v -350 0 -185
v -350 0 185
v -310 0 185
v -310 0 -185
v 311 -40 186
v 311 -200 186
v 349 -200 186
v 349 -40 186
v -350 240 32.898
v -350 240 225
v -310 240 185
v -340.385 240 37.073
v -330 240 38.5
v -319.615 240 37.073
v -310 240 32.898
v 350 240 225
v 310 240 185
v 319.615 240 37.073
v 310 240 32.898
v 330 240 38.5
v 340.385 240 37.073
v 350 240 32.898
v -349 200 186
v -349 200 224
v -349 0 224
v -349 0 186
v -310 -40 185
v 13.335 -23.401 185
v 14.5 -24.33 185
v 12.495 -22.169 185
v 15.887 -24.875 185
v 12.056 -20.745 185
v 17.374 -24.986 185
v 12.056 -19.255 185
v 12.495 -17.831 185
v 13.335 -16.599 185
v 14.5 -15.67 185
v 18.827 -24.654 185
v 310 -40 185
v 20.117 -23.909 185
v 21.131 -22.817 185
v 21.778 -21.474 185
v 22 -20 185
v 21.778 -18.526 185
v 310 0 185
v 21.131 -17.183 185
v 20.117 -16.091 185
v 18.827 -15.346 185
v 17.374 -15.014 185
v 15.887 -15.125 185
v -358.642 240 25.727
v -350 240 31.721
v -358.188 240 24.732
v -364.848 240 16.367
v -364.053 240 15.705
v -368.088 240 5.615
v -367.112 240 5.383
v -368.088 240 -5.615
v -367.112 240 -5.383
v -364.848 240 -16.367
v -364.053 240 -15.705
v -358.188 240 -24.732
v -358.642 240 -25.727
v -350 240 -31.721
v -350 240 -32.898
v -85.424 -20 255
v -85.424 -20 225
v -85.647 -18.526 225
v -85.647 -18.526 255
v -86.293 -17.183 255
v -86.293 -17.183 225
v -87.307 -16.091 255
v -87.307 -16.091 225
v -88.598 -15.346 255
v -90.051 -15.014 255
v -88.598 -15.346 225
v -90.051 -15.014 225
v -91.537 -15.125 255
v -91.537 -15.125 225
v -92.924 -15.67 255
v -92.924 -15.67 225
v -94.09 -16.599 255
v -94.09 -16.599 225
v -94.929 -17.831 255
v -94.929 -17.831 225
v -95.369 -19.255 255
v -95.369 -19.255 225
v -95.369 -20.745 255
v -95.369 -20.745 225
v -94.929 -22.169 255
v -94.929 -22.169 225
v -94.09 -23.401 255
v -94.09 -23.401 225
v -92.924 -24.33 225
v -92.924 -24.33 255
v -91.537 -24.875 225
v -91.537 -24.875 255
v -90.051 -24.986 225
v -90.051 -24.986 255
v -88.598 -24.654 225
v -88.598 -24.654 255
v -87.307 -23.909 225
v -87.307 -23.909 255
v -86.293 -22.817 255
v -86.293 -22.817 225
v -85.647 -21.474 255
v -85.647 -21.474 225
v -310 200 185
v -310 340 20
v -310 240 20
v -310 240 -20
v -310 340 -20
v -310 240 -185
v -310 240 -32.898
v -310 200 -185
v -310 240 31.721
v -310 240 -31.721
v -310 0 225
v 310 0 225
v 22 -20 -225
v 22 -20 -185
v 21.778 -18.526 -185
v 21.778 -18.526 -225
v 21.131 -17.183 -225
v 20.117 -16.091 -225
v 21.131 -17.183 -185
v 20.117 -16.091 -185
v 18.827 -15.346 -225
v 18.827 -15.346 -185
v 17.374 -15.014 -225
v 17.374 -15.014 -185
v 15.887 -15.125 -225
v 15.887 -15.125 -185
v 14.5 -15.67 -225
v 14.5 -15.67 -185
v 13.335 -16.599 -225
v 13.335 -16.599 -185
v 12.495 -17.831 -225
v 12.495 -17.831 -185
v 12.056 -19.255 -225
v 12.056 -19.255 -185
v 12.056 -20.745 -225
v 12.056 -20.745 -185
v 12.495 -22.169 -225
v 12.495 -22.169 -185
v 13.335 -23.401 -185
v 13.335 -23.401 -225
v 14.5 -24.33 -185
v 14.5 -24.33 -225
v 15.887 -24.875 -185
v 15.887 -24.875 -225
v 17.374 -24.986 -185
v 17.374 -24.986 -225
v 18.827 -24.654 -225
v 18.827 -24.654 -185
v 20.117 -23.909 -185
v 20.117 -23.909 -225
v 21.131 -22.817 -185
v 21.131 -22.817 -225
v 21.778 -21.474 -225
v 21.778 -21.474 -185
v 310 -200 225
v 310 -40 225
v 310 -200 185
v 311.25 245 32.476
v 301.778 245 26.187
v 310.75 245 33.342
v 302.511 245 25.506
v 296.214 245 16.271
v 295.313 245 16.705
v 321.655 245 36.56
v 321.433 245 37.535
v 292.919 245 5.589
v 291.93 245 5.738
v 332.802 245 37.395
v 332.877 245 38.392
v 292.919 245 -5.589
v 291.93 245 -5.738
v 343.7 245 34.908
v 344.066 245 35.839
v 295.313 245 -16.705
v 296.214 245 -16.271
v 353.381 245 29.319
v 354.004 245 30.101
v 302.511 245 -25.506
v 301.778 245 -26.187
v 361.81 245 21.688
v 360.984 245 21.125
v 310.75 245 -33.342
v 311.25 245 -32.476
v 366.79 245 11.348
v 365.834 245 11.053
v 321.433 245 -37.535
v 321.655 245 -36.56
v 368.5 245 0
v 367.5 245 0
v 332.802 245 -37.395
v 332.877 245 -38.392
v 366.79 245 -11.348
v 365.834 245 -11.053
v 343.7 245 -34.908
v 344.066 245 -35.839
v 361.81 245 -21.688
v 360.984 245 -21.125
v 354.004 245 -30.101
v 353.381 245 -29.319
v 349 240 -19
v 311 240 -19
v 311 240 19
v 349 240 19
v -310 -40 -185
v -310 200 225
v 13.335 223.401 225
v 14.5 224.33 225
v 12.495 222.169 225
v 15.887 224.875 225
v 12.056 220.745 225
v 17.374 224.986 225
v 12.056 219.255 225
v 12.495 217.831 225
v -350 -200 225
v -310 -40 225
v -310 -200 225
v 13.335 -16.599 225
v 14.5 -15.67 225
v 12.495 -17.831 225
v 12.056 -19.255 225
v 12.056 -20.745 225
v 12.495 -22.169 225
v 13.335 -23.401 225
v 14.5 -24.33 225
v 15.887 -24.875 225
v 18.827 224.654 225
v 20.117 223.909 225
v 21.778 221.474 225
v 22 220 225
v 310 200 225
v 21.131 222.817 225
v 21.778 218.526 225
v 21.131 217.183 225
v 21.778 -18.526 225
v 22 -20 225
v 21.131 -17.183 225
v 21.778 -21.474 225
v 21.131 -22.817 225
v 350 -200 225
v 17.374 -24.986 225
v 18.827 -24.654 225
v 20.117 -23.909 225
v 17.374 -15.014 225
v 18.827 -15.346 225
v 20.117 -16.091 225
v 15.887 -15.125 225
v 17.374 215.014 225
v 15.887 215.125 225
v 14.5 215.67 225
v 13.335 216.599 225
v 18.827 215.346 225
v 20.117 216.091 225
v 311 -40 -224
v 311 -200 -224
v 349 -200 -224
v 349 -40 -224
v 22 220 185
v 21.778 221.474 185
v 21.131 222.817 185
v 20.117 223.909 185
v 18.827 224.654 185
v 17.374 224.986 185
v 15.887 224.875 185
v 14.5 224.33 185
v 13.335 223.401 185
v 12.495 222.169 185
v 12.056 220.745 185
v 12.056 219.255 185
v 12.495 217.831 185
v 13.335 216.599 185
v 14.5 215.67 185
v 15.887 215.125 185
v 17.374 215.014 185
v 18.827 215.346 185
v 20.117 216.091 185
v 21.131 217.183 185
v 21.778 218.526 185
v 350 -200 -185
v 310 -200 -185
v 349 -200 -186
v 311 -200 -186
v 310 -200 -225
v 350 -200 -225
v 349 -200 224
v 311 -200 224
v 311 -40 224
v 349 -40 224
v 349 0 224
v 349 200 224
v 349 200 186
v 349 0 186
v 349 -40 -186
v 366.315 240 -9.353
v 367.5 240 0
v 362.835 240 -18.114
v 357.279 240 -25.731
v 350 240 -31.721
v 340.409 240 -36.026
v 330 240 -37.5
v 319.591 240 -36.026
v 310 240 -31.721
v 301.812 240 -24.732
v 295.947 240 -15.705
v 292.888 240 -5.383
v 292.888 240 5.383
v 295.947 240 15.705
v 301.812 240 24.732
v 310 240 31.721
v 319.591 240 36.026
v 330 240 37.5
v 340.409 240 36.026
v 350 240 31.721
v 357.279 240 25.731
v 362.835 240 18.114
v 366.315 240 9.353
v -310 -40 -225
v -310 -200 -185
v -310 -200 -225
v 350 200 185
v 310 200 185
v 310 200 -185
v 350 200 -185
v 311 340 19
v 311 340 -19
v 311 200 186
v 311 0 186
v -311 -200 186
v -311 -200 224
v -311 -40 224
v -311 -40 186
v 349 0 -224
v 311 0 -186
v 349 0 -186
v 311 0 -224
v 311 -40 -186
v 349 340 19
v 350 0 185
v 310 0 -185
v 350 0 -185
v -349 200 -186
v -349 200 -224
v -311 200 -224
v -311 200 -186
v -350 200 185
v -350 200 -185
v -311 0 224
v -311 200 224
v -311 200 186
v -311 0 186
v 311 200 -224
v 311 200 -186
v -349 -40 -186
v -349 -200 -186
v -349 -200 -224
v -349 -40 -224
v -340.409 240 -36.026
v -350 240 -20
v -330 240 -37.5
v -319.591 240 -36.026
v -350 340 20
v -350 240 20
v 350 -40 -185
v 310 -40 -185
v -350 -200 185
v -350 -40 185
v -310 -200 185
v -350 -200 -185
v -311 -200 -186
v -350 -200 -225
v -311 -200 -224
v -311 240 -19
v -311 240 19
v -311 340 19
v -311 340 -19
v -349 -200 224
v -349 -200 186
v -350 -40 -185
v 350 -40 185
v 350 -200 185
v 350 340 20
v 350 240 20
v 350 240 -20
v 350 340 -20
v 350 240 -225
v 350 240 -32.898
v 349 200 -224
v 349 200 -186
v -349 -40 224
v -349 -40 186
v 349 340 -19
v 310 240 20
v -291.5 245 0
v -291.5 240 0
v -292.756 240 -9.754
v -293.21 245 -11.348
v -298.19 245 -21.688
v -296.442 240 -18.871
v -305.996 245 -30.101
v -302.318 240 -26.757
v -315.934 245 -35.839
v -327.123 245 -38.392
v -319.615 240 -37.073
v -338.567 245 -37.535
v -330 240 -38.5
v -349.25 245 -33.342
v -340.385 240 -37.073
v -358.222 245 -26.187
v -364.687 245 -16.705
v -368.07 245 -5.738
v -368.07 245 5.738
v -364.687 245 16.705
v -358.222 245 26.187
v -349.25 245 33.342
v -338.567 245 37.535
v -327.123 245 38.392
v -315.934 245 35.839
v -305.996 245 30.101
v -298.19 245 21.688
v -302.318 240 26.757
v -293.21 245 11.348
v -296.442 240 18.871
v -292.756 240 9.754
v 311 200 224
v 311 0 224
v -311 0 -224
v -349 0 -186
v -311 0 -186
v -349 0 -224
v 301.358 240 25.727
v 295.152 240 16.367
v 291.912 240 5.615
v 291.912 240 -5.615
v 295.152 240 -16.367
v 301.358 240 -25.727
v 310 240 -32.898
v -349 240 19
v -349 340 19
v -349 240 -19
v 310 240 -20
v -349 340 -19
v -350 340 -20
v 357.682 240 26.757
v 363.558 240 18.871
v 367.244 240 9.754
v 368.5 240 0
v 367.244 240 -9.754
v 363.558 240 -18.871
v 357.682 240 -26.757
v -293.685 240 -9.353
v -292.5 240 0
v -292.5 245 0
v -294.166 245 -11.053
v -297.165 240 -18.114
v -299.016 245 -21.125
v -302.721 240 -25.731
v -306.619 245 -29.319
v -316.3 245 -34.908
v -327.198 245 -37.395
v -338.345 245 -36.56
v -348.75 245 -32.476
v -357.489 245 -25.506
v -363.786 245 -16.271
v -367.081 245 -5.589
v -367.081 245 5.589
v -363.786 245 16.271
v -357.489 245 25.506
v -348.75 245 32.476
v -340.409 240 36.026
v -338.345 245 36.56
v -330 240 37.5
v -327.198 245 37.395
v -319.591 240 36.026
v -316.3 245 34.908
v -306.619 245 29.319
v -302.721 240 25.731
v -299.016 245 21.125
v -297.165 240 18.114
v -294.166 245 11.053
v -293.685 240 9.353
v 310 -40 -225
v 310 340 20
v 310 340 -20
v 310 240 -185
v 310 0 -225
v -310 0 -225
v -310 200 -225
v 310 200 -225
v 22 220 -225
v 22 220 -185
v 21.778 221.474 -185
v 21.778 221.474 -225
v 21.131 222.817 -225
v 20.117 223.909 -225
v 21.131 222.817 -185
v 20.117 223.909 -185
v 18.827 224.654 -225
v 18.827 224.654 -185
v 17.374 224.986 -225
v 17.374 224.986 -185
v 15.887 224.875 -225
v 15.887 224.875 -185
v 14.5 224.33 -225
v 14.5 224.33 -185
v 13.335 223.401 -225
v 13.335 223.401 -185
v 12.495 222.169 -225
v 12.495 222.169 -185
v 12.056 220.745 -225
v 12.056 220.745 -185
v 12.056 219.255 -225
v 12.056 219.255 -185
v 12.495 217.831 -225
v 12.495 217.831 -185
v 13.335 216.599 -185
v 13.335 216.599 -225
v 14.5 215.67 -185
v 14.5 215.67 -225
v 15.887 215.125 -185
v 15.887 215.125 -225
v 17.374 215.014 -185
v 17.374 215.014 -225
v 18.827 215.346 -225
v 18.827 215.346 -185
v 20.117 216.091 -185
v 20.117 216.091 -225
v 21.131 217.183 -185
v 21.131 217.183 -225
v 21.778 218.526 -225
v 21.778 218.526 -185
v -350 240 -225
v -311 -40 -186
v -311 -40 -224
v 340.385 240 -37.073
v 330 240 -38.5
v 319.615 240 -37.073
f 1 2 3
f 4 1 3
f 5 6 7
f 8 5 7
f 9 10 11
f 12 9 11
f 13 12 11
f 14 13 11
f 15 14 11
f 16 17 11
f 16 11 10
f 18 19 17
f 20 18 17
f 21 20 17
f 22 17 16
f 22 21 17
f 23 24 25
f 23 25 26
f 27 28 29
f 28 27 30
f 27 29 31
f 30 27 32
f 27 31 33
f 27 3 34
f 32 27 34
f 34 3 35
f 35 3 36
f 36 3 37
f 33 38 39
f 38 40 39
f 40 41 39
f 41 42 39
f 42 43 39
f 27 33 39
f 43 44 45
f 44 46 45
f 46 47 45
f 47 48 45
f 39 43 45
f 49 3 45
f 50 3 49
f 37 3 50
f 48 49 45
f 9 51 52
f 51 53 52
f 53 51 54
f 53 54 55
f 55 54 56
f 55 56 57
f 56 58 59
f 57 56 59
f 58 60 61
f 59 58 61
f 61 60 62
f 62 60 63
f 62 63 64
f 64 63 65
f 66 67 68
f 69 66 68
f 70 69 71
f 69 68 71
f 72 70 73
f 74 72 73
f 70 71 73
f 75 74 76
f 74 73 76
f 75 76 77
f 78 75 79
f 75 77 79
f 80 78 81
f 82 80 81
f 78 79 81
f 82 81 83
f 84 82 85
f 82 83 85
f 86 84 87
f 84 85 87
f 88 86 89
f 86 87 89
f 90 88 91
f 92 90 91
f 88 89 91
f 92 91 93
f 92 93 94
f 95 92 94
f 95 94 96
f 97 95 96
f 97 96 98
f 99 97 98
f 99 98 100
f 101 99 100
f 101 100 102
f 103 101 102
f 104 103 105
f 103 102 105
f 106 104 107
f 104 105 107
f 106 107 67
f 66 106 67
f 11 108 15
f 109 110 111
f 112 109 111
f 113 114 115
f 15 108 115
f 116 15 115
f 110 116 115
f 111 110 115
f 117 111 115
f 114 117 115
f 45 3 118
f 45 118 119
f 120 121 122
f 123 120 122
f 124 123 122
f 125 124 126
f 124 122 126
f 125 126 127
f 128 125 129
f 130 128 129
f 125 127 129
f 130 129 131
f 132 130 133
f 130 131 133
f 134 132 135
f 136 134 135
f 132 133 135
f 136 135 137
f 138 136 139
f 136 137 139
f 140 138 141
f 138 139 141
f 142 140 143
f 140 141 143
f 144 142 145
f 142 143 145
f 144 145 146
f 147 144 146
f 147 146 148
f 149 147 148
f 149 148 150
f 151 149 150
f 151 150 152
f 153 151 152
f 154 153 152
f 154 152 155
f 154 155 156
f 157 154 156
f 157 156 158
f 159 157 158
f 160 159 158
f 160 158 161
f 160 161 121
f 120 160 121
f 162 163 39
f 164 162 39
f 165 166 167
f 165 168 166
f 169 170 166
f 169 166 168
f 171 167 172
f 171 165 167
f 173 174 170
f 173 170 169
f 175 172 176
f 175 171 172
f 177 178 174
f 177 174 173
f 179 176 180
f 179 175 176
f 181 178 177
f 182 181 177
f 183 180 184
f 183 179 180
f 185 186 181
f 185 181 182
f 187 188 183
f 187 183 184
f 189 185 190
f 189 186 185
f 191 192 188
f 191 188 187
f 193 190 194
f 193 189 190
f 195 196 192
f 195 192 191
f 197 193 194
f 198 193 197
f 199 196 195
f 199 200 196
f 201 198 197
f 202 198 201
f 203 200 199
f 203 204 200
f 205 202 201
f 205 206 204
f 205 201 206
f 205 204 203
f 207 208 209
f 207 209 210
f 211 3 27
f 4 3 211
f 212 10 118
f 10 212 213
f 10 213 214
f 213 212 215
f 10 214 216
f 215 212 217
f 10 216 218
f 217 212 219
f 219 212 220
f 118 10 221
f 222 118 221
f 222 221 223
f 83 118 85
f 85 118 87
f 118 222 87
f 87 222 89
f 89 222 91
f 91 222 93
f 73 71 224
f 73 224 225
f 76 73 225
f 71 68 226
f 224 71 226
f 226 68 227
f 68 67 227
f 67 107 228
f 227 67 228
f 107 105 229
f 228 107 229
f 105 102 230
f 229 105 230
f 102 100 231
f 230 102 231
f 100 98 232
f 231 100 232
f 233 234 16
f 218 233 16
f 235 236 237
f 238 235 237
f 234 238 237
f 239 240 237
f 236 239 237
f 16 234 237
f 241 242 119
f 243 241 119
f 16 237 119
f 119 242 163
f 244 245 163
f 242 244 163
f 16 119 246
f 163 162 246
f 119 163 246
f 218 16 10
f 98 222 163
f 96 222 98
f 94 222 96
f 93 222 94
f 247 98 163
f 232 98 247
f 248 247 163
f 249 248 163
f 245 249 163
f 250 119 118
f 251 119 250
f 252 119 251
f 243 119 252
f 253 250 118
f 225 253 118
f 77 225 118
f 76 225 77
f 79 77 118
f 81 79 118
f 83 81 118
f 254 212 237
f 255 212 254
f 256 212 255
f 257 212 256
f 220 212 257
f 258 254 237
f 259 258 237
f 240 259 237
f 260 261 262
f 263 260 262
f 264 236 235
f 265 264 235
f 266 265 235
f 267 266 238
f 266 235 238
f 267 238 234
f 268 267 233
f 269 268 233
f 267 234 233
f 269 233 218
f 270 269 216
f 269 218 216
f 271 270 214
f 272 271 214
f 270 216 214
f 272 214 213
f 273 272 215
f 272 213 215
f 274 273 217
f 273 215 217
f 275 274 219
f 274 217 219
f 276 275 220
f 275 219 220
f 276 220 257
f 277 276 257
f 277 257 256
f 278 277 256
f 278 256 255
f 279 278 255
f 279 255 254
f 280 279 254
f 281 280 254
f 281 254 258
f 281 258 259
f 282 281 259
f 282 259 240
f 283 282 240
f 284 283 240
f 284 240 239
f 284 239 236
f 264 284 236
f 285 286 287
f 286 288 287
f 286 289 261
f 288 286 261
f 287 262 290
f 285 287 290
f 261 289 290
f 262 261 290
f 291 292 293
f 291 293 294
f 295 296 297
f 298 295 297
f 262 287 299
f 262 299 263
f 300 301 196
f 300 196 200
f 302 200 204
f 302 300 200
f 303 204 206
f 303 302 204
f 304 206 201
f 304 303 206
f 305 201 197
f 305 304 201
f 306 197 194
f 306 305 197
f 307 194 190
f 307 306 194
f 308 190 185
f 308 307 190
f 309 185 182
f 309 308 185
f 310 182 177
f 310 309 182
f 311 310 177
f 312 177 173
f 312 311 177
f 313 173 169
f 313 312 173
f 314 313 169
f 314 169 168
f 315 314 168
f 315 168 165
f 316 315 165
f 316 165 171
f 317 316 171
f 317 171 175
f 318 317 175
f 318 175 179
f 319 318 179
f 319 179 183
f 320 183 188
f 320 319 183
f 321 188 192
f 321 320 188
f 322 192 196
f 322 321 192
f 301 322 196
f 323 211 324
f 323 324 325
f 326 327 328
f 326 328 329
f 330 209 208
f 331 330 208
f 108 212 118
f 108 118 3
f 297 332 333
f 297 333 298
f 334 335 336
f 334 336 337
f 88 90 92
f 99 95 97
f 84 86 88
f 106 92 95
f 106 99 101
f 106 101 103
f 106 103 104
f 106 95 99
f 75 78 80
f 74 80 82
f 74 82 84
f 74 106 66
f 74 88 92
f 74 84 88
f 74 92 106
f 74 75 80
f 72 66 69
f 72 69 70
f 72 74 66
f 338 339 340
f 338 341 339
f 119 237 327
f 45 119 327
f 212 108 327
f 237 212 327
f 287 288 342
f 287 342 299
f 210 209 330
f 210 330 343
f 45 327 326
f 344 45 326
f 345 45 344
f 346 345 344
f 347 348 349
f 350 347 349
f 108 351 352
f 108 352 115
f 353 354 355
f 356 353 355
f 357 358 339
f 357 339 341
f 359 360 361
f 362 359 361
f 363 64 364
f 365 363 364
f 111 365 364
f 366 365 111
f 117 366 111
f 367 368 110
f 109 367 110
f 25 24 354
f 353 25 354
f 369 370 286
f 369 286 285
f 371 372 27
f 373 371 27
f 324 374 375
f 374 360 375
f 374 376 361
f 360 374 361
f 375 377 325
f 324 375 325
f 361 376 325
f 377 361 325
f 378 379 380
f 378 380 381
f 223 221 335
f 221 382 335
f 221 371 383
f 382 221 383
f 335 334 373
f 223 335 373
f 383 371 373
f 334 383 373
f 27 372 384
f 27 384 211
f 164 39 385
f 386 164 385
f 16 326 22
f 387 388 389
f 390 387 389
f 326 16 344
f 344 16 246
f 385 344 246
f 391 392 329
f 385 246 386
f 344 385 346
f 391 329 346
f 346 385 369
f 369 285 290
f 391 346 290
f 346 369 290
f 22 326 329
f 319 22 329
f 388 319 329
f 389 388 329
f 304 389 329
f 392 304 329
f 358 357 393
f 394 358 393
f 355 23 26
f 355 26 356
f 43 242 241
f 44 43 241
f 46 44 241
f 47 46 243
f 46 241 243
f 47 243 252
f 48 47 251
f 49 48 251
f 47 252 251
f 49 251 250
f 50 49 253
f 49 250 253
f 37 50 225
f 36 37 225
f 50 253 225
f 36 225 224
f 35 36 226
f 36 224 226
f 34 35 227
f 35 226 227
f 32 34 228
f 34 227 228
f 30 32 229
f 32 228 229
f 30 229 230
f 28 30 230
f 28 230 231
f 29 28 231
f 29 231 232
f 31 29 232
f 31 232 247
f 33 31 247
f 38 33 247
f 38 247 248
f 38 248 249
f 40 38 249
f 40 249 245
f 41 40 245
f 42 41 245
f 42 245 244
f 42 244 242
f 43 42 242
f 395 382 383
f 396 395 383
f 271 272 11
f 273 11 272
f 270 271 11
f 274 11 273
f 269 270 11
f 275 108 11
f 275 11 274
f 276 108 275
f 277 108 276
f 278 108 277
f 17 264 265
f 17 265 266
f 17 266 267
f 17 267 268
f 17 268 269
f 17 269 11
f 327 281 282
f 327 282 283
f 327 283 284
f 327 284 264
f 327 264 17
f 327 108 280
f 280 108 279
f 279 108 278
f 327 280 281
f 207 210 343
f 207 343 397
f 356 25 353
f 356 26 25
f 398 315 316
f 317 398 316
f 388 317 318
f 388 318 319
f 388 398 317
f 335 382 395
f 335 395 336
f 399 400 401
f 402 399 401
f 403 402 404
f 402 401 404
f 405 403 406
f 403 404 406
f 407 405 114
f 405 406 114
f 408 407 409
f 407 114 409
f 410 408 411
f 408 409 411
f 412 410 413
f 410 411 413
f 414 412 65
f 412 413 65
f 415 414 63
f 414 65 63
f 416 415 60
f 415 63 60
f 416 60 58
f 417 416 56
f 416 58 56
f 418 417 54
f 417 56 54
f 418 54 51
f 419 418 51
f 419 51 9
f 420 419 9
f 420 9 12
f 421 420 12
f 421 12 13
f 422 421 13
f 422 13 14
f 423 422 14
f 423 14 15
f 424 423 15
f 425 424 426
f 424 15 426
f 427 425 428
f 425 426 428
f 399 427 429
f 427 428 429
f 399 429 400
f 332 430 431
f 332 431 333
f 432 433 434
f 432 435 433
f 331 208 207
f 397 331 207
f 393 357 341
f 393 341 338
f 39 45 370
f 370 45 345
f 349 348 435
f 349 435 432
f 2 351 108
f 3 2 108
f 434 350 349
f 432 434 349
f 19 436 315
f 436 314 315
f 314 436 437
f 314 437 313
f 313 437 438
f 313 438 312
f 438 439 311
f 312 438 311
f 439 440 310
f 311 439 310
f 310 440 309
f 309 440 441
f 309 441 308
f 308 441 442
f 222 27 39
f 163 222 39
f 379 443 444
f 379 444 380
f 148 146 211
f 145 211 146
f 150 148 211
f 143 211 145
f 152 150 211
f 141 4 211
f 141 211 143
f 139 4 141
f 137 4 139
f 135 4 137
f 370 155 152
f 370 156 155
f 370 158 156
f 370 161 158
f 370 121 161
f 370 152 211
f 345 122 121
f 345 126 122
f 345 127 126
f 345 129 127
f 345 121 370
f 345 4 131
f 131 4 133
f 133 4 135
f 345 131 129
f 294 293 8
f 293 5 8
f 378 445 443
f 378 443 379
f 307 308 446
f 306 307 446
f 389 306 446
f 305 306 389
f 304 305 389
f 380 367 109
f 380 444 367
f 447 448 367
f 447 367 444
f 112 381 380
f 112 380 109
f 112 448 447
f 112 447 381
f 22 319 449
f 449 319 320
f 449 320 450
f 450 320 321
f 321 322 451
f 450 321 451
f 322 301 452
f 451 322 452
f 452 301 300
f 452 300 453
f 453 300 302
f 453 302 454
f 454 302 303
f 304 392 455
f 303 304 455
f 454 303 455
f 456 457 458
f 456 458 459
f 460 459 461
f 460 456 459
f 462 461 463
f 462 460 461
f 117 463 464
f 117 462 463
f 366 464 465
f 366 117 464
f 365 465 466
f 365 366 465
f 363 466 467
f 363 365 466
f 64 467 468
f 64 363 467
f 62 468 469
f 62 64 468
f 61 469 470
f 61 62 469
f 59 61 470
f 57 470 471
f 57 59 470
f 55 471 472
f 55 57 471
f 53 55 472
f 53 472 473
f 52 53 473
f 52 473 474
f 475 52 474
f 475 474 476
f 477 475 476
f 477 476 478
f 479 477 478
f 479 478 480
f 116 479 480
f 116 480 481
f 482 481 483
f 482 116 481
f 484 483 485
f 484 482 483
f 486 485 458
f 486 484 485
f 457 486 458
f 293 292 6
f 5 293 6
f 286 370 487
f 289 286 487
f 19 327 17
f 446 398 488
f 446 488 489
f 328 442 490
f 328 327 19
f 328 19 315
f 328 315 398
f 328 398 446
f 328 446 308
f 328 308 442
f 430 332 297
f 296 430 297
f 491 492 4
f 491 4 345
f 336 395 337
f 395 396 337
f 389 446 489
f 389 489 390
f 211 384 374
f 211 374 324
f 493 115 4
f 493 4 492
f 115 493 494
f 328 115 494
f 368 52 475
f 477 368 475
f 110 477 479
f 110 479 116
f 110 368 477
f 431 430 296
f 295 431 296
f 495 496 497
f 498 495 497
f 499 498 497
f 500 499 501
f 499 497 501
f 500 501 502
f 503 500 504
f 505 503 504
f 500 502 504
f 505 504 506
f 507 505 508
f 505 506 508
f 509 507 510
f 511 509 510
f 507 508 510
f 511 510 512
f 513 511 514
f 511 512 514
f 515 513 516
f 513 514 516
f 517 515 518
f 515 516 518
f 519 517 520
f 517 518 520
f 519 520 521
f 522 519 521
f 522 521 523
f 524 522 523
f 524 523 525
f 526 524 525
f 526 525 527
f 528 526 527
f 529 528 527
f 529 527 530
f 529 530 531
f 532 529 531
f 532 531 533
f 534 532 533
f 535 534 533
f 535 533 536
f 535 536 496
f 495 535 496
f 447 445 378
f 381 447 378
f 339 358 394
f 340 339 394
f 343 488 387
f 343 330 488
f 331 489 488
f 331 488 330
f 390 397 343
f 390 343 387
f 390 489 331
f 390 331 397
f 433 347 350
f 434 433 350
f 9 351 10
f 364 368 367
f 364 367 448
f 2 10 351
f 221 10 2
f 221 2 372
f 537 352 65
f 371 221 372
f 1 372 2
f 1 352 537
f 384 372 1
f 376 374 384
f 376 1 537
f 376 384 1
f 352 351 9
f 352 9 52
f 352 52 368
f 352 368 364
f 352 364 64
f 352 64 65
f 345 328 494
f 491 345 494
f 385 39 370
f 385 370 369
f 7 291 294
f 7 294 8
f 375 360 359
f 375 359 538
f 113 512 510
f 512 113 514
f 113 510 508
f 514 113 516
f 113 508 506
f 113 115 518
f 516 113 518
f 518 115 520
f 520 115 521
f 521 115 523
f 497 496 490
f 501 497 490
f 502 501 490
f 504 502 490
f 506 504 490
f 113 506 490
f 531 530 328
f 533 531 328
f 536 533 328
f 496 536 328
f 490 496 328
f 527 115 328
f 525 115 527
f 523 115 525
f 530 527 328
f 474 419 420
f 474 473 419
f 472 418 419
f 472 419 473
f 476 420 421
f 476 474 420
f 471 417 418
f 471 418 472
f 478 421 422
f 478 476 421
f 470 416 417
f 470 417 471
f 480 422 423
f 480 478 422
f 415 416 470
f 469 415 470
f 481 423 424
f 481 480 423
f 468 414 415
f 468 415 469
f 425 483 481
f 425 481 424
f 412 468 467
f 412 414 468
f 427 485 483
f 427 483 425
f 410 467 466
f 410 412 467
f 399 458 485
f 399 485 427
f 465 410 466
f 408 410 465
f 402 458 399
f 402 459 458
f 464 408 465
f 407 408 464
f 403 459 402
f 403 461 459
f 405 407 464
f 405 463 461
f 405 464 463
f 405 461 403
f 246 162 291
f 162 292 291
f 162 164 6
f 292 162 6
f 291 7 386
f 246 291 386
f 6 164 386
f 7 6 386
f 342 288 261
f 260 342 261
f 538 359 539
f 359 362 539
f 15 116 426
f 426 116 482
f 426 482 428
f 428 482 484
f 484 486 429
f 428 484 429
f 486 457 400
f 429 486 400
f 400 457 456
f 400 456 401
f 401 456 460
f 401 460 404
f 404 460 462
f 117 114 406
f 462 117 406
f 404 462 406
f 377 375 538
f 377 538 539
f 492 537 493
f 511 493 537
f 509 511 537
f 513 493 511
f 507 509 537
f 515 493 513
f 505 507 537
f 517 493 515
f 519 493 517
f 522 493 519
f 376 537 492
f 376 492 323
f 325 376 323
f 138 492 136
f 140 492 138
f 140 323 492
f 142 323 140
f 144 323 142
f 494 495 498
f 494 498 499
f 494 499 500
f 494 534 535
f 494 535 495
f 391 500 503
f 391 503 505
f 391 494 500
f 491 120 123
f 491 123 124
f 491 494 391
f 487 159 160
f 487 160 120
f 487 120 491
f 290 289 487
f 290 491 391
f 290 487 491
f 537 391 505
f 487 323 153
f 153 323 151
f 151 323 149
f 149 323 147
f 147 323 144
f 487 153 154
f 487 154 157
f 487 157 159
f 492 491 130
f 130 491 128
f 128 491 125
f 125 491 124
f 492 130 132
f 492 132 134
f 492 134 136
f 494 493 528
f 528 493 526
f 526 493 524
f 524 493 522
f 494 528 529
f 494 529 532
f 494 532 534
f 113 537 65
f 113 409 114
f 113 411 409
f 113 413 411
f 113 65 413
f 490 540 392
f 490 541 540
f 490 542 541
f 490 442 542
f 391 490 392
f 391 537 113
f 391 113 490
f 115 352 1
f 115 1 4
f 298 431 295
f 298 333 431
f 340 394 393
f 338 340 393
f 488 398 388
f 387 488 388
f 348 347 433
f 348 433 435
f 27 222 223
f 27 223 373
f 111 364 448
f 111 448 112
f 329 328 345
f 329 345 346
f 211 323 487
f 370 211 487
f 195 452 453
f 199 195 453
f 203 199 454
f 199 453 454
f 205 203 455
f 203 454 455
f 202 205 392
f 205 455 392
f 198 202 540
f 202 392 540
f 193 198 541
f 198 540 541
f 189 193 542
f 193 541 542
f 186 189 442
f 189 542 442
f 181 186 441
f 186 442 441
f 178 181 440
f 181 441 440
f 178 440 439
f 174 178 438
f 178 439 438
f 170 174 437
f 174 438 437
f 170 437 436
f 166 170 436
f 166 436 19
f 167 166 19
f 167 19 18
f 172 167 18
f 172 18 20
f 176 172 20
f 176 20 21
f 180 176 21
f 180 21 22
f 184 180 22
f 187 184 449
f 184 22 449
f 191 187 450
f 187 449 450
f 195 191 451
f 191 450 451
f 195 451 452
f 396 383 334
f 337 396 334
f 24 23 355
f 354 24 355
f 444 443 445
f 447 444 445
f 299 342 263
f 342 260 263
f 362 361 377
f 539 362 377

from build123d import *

# Parameters (mm, degrees)
SKETCH1_W             = 40
SKETCH1_H             = 40
SKETCH1_W_2           = 38
SKETCH1_H_2           = 38
BOSS_EXTRUDE1_DEPTH   = 200
BOSS_EXTRUDE1_2_DEPTH = 200
BOSS_EXTRUDE1_3_DEPTH = 200
BOSS_EXTRUDE1_4_DEPTH = 200
SKETCH2_W             = 700
SKETCH2_H             = 450
SKETCH2_W_2           = 620
SKETCH2_H_2           = 370
BOSS_EXTRUDE2_DEPTH   = 40
SKETCH3_W             = 40
SKETCH3_H             = 40
SKETCH3_W_2           = 38
SKETCH3_H_2           = 38
BOSS_EXTRUDE4_DEPTH   = 100
SKETCH4_R             = 5
CUT_EXTRUDE1_DEPTH    = 465
SKETCH5_W             = 700
SKETCH5_H             = 450
SKETCH5_W_2           = 620
SKETCH5_H_2           = 370
BOSS_EXTRUDE5_DEPTH   = 40
SKETCH6_R             = 5
CUT_EXTRUDE2_DEPTH    = 508
SKETCH7_R             = 38.5
SKETCH7_R_2           = 37.5
BOSS_EXTRUDE6_DEPTH   = 5
SKETCH8_R             = 5
BOSS_EXTRUDE7_DEPTH   = 30


with BuildPart() as part:
    # Sketch1 → Boss-Extrude1 (new body, symmetric)
    with BuildSketch(Plane(origin=(0, 0, 0), x_dir=(1, 0, 0), z_dir=(0, 1, 0))):
        with Locations((-330, 205)):
            Rectangle(SKETCH1_W, SKETCH1_H)
        with Locations((-330, 205)):
            Rectangle(SKETCH1_W_2, SKETCH1_H_2, mode=Mode.SUBTRACT)
    extrude(amount=BOSS_EXTRUDE1_DEPTH, both=True)



with BuildPart() as body_2:
    # Sketch1 → Boss-Extrude1 2 (new body, symmetric)
    with BuildSketch(Plane(origin=(0, 0, 0), x_dir=(1, 0, 0), z_dir=(0, 1, 0))):
        with Locations((330, 205)):
            Rectangle(SKETCH1_W, SKETCH1_H)
        with Locations((330, 205)):
            Rectangle(SKETCH1_W_2, SKETCH1_H_2, mode=Mode.SUBTRACT)
    extrude(amount=BOSS_EXTRUDE1_2_DEPTH, both=True)


with BuildPart() as body_3:
    # Sketch1 → Boss-Extrude1 3 (new body, symmetric)
    with BuildSketch(Plane(origin=(0, 0, 0), x_dir=(1, 0, 0), z_dir=(0, 1, 0))):
        with Locations((330, -205)):
            Rectangle(SKETCH1_W, SKETCH1_H)
        with Locations((330, -205)):
            Rectangle(SKETCH1_W_2, SKETCH1_H_2, mode=Mode.SUBTRACT)
    extrude(amount=BOSS_EXTRUDE1_3_DEPTH, both=True)


with BuildPart() as body_4:
    # Sketch1 → Boss-Extrude1 4 (new body, symmetric)
    with BuildSketch(Plane(origin=(0, 0, 0), x_dir=(1, 0, 0), z_dir=(0, 1, 0))):
        with Locations((-330, -205)):
            Rectangle(SKETCH1_W, SKETCH1_H)
        with Locations((-330, -205)):
            Rectangle(SKETCH1_W_2, SKETCH1_H_2, mode=Mode.SUBTRACT)
    extrude(amount=BOSS_EXTRUDE1_4_DEPTH, both=True)


with BuildPart() as part_1:
    add(part.part)

    add(body_2.part)  # Boss-Extrude2 merges body 2

    add(body_3.part)  # Boss-Extrude2 merges body 3

    add(body_4.part)  # Boss-Extrude2 merges body 4
    # Sketch2 → Boss-Extrude2 (add)
    with BuildSketch(Plane(origin=(0, 200, 0), x_dir=(1, 0, 0), z_dir=(0, 1, 0))):
        Rectangle(SKETCH2_W, SKETCH2_H)
        Rectangle(SKETCH2_W_2, SKETCH2_H_2, mode=Mode.SUBTRACT)
    extrude(amount=BOSS_EXTRUDE2_DEPTH)

    # Sketch3 → Boss-Extrude4 (add)
    with BuildSketch(Plane(origin=(0, 240, 0), x_dir=(1, 0, 0), z_dir=(0, 1, 0))):
        with Locations((-330, 0)):
            Rectangle(SKETCH3_W, SKETCH3_H)
        with Locations((-330, 0)):
            Rectangle(SKETCH3_W_2, SKETCH3_H_2, mode=Mode.SUBTRACT)
        with Locations((330, 0)):
            Rectangle(SKETCH3_W, SKETCH3_H)
        with Locations((330, 0)):
            Rectangle(SKETCH3_W_2, SKETCH3_H_2, mode=Mode.SUBTRACT)
    extrude(amount=BOSS_EXTRUDE4_DEPTH)

    # Sketch4 → Cut-Extrude1 (cut)
    with BuildSketch(Plane.XY.offset(225)):
        with Locations((17, 220)):
            Circle(SKETCH4_R)
    extrude(amount=-CUT_EXTRUDE1_DEPTH, mode=Mode.SUBTRACT)

    # Sketch5 → Boss-Extrude5 (add)
    with BuildSketch(Plane(origin=(0, 0, 0), x_dir=(1, 0, 0), z_dir=(0, 1, 0))):
        Rectangle(SKETCH5_W, SKETCH5_H)
        Rectangle(SKETCH5_W_2, SKETCH5_H_2, mode=Mode.SUBTRACT)
    extrude(amount=-BOSS_EXTRUDE5_DEPTH)

    # Sketch6 → Cut-Extrude2 (cut)
    with BuildSketch(Plane.XY.offset(225)):
        with Locations((17, -20)):
            Circle(SKETCH6_R)
    extrude(amount=-CUT_EXTRUDE2_DEPTH, mode=Mode.SUBTRACT)

    # Sketch7 → Boss-Extrude6 (add)
    with BuildSketch(Plane(origin=(0, 240, 0), x_dir=(1, 0, 0), z_dir=(0, 1, 0))):
        with Locations((-330, 0)):
            Circle(SKETCH7_R)
        with Locations((-330, 0)):
            Circle(SKETCH7_R_2, mode=Mode.SUBTRACT)
        with Locations((330, 0)):
            Circle(SKETCH7_R)
        with Locations((330, 0)):
            Circle(SKETCH7_R_2, mode=Mode.SUBTRACT)
    extrude(amount=BOSS_EXTRUDE6_DEPTH)

    # Sketch8 → Boss-Extrude7 (add)
    with BuildSketch(Plane.XY.offset(225)):
        with Locations((-90.424393733, -20)):
            Circle(SKETCH8_R)
    extrude(amount=BOSS_EXTRUDE7_DEPTH)


solid = part_1.part
